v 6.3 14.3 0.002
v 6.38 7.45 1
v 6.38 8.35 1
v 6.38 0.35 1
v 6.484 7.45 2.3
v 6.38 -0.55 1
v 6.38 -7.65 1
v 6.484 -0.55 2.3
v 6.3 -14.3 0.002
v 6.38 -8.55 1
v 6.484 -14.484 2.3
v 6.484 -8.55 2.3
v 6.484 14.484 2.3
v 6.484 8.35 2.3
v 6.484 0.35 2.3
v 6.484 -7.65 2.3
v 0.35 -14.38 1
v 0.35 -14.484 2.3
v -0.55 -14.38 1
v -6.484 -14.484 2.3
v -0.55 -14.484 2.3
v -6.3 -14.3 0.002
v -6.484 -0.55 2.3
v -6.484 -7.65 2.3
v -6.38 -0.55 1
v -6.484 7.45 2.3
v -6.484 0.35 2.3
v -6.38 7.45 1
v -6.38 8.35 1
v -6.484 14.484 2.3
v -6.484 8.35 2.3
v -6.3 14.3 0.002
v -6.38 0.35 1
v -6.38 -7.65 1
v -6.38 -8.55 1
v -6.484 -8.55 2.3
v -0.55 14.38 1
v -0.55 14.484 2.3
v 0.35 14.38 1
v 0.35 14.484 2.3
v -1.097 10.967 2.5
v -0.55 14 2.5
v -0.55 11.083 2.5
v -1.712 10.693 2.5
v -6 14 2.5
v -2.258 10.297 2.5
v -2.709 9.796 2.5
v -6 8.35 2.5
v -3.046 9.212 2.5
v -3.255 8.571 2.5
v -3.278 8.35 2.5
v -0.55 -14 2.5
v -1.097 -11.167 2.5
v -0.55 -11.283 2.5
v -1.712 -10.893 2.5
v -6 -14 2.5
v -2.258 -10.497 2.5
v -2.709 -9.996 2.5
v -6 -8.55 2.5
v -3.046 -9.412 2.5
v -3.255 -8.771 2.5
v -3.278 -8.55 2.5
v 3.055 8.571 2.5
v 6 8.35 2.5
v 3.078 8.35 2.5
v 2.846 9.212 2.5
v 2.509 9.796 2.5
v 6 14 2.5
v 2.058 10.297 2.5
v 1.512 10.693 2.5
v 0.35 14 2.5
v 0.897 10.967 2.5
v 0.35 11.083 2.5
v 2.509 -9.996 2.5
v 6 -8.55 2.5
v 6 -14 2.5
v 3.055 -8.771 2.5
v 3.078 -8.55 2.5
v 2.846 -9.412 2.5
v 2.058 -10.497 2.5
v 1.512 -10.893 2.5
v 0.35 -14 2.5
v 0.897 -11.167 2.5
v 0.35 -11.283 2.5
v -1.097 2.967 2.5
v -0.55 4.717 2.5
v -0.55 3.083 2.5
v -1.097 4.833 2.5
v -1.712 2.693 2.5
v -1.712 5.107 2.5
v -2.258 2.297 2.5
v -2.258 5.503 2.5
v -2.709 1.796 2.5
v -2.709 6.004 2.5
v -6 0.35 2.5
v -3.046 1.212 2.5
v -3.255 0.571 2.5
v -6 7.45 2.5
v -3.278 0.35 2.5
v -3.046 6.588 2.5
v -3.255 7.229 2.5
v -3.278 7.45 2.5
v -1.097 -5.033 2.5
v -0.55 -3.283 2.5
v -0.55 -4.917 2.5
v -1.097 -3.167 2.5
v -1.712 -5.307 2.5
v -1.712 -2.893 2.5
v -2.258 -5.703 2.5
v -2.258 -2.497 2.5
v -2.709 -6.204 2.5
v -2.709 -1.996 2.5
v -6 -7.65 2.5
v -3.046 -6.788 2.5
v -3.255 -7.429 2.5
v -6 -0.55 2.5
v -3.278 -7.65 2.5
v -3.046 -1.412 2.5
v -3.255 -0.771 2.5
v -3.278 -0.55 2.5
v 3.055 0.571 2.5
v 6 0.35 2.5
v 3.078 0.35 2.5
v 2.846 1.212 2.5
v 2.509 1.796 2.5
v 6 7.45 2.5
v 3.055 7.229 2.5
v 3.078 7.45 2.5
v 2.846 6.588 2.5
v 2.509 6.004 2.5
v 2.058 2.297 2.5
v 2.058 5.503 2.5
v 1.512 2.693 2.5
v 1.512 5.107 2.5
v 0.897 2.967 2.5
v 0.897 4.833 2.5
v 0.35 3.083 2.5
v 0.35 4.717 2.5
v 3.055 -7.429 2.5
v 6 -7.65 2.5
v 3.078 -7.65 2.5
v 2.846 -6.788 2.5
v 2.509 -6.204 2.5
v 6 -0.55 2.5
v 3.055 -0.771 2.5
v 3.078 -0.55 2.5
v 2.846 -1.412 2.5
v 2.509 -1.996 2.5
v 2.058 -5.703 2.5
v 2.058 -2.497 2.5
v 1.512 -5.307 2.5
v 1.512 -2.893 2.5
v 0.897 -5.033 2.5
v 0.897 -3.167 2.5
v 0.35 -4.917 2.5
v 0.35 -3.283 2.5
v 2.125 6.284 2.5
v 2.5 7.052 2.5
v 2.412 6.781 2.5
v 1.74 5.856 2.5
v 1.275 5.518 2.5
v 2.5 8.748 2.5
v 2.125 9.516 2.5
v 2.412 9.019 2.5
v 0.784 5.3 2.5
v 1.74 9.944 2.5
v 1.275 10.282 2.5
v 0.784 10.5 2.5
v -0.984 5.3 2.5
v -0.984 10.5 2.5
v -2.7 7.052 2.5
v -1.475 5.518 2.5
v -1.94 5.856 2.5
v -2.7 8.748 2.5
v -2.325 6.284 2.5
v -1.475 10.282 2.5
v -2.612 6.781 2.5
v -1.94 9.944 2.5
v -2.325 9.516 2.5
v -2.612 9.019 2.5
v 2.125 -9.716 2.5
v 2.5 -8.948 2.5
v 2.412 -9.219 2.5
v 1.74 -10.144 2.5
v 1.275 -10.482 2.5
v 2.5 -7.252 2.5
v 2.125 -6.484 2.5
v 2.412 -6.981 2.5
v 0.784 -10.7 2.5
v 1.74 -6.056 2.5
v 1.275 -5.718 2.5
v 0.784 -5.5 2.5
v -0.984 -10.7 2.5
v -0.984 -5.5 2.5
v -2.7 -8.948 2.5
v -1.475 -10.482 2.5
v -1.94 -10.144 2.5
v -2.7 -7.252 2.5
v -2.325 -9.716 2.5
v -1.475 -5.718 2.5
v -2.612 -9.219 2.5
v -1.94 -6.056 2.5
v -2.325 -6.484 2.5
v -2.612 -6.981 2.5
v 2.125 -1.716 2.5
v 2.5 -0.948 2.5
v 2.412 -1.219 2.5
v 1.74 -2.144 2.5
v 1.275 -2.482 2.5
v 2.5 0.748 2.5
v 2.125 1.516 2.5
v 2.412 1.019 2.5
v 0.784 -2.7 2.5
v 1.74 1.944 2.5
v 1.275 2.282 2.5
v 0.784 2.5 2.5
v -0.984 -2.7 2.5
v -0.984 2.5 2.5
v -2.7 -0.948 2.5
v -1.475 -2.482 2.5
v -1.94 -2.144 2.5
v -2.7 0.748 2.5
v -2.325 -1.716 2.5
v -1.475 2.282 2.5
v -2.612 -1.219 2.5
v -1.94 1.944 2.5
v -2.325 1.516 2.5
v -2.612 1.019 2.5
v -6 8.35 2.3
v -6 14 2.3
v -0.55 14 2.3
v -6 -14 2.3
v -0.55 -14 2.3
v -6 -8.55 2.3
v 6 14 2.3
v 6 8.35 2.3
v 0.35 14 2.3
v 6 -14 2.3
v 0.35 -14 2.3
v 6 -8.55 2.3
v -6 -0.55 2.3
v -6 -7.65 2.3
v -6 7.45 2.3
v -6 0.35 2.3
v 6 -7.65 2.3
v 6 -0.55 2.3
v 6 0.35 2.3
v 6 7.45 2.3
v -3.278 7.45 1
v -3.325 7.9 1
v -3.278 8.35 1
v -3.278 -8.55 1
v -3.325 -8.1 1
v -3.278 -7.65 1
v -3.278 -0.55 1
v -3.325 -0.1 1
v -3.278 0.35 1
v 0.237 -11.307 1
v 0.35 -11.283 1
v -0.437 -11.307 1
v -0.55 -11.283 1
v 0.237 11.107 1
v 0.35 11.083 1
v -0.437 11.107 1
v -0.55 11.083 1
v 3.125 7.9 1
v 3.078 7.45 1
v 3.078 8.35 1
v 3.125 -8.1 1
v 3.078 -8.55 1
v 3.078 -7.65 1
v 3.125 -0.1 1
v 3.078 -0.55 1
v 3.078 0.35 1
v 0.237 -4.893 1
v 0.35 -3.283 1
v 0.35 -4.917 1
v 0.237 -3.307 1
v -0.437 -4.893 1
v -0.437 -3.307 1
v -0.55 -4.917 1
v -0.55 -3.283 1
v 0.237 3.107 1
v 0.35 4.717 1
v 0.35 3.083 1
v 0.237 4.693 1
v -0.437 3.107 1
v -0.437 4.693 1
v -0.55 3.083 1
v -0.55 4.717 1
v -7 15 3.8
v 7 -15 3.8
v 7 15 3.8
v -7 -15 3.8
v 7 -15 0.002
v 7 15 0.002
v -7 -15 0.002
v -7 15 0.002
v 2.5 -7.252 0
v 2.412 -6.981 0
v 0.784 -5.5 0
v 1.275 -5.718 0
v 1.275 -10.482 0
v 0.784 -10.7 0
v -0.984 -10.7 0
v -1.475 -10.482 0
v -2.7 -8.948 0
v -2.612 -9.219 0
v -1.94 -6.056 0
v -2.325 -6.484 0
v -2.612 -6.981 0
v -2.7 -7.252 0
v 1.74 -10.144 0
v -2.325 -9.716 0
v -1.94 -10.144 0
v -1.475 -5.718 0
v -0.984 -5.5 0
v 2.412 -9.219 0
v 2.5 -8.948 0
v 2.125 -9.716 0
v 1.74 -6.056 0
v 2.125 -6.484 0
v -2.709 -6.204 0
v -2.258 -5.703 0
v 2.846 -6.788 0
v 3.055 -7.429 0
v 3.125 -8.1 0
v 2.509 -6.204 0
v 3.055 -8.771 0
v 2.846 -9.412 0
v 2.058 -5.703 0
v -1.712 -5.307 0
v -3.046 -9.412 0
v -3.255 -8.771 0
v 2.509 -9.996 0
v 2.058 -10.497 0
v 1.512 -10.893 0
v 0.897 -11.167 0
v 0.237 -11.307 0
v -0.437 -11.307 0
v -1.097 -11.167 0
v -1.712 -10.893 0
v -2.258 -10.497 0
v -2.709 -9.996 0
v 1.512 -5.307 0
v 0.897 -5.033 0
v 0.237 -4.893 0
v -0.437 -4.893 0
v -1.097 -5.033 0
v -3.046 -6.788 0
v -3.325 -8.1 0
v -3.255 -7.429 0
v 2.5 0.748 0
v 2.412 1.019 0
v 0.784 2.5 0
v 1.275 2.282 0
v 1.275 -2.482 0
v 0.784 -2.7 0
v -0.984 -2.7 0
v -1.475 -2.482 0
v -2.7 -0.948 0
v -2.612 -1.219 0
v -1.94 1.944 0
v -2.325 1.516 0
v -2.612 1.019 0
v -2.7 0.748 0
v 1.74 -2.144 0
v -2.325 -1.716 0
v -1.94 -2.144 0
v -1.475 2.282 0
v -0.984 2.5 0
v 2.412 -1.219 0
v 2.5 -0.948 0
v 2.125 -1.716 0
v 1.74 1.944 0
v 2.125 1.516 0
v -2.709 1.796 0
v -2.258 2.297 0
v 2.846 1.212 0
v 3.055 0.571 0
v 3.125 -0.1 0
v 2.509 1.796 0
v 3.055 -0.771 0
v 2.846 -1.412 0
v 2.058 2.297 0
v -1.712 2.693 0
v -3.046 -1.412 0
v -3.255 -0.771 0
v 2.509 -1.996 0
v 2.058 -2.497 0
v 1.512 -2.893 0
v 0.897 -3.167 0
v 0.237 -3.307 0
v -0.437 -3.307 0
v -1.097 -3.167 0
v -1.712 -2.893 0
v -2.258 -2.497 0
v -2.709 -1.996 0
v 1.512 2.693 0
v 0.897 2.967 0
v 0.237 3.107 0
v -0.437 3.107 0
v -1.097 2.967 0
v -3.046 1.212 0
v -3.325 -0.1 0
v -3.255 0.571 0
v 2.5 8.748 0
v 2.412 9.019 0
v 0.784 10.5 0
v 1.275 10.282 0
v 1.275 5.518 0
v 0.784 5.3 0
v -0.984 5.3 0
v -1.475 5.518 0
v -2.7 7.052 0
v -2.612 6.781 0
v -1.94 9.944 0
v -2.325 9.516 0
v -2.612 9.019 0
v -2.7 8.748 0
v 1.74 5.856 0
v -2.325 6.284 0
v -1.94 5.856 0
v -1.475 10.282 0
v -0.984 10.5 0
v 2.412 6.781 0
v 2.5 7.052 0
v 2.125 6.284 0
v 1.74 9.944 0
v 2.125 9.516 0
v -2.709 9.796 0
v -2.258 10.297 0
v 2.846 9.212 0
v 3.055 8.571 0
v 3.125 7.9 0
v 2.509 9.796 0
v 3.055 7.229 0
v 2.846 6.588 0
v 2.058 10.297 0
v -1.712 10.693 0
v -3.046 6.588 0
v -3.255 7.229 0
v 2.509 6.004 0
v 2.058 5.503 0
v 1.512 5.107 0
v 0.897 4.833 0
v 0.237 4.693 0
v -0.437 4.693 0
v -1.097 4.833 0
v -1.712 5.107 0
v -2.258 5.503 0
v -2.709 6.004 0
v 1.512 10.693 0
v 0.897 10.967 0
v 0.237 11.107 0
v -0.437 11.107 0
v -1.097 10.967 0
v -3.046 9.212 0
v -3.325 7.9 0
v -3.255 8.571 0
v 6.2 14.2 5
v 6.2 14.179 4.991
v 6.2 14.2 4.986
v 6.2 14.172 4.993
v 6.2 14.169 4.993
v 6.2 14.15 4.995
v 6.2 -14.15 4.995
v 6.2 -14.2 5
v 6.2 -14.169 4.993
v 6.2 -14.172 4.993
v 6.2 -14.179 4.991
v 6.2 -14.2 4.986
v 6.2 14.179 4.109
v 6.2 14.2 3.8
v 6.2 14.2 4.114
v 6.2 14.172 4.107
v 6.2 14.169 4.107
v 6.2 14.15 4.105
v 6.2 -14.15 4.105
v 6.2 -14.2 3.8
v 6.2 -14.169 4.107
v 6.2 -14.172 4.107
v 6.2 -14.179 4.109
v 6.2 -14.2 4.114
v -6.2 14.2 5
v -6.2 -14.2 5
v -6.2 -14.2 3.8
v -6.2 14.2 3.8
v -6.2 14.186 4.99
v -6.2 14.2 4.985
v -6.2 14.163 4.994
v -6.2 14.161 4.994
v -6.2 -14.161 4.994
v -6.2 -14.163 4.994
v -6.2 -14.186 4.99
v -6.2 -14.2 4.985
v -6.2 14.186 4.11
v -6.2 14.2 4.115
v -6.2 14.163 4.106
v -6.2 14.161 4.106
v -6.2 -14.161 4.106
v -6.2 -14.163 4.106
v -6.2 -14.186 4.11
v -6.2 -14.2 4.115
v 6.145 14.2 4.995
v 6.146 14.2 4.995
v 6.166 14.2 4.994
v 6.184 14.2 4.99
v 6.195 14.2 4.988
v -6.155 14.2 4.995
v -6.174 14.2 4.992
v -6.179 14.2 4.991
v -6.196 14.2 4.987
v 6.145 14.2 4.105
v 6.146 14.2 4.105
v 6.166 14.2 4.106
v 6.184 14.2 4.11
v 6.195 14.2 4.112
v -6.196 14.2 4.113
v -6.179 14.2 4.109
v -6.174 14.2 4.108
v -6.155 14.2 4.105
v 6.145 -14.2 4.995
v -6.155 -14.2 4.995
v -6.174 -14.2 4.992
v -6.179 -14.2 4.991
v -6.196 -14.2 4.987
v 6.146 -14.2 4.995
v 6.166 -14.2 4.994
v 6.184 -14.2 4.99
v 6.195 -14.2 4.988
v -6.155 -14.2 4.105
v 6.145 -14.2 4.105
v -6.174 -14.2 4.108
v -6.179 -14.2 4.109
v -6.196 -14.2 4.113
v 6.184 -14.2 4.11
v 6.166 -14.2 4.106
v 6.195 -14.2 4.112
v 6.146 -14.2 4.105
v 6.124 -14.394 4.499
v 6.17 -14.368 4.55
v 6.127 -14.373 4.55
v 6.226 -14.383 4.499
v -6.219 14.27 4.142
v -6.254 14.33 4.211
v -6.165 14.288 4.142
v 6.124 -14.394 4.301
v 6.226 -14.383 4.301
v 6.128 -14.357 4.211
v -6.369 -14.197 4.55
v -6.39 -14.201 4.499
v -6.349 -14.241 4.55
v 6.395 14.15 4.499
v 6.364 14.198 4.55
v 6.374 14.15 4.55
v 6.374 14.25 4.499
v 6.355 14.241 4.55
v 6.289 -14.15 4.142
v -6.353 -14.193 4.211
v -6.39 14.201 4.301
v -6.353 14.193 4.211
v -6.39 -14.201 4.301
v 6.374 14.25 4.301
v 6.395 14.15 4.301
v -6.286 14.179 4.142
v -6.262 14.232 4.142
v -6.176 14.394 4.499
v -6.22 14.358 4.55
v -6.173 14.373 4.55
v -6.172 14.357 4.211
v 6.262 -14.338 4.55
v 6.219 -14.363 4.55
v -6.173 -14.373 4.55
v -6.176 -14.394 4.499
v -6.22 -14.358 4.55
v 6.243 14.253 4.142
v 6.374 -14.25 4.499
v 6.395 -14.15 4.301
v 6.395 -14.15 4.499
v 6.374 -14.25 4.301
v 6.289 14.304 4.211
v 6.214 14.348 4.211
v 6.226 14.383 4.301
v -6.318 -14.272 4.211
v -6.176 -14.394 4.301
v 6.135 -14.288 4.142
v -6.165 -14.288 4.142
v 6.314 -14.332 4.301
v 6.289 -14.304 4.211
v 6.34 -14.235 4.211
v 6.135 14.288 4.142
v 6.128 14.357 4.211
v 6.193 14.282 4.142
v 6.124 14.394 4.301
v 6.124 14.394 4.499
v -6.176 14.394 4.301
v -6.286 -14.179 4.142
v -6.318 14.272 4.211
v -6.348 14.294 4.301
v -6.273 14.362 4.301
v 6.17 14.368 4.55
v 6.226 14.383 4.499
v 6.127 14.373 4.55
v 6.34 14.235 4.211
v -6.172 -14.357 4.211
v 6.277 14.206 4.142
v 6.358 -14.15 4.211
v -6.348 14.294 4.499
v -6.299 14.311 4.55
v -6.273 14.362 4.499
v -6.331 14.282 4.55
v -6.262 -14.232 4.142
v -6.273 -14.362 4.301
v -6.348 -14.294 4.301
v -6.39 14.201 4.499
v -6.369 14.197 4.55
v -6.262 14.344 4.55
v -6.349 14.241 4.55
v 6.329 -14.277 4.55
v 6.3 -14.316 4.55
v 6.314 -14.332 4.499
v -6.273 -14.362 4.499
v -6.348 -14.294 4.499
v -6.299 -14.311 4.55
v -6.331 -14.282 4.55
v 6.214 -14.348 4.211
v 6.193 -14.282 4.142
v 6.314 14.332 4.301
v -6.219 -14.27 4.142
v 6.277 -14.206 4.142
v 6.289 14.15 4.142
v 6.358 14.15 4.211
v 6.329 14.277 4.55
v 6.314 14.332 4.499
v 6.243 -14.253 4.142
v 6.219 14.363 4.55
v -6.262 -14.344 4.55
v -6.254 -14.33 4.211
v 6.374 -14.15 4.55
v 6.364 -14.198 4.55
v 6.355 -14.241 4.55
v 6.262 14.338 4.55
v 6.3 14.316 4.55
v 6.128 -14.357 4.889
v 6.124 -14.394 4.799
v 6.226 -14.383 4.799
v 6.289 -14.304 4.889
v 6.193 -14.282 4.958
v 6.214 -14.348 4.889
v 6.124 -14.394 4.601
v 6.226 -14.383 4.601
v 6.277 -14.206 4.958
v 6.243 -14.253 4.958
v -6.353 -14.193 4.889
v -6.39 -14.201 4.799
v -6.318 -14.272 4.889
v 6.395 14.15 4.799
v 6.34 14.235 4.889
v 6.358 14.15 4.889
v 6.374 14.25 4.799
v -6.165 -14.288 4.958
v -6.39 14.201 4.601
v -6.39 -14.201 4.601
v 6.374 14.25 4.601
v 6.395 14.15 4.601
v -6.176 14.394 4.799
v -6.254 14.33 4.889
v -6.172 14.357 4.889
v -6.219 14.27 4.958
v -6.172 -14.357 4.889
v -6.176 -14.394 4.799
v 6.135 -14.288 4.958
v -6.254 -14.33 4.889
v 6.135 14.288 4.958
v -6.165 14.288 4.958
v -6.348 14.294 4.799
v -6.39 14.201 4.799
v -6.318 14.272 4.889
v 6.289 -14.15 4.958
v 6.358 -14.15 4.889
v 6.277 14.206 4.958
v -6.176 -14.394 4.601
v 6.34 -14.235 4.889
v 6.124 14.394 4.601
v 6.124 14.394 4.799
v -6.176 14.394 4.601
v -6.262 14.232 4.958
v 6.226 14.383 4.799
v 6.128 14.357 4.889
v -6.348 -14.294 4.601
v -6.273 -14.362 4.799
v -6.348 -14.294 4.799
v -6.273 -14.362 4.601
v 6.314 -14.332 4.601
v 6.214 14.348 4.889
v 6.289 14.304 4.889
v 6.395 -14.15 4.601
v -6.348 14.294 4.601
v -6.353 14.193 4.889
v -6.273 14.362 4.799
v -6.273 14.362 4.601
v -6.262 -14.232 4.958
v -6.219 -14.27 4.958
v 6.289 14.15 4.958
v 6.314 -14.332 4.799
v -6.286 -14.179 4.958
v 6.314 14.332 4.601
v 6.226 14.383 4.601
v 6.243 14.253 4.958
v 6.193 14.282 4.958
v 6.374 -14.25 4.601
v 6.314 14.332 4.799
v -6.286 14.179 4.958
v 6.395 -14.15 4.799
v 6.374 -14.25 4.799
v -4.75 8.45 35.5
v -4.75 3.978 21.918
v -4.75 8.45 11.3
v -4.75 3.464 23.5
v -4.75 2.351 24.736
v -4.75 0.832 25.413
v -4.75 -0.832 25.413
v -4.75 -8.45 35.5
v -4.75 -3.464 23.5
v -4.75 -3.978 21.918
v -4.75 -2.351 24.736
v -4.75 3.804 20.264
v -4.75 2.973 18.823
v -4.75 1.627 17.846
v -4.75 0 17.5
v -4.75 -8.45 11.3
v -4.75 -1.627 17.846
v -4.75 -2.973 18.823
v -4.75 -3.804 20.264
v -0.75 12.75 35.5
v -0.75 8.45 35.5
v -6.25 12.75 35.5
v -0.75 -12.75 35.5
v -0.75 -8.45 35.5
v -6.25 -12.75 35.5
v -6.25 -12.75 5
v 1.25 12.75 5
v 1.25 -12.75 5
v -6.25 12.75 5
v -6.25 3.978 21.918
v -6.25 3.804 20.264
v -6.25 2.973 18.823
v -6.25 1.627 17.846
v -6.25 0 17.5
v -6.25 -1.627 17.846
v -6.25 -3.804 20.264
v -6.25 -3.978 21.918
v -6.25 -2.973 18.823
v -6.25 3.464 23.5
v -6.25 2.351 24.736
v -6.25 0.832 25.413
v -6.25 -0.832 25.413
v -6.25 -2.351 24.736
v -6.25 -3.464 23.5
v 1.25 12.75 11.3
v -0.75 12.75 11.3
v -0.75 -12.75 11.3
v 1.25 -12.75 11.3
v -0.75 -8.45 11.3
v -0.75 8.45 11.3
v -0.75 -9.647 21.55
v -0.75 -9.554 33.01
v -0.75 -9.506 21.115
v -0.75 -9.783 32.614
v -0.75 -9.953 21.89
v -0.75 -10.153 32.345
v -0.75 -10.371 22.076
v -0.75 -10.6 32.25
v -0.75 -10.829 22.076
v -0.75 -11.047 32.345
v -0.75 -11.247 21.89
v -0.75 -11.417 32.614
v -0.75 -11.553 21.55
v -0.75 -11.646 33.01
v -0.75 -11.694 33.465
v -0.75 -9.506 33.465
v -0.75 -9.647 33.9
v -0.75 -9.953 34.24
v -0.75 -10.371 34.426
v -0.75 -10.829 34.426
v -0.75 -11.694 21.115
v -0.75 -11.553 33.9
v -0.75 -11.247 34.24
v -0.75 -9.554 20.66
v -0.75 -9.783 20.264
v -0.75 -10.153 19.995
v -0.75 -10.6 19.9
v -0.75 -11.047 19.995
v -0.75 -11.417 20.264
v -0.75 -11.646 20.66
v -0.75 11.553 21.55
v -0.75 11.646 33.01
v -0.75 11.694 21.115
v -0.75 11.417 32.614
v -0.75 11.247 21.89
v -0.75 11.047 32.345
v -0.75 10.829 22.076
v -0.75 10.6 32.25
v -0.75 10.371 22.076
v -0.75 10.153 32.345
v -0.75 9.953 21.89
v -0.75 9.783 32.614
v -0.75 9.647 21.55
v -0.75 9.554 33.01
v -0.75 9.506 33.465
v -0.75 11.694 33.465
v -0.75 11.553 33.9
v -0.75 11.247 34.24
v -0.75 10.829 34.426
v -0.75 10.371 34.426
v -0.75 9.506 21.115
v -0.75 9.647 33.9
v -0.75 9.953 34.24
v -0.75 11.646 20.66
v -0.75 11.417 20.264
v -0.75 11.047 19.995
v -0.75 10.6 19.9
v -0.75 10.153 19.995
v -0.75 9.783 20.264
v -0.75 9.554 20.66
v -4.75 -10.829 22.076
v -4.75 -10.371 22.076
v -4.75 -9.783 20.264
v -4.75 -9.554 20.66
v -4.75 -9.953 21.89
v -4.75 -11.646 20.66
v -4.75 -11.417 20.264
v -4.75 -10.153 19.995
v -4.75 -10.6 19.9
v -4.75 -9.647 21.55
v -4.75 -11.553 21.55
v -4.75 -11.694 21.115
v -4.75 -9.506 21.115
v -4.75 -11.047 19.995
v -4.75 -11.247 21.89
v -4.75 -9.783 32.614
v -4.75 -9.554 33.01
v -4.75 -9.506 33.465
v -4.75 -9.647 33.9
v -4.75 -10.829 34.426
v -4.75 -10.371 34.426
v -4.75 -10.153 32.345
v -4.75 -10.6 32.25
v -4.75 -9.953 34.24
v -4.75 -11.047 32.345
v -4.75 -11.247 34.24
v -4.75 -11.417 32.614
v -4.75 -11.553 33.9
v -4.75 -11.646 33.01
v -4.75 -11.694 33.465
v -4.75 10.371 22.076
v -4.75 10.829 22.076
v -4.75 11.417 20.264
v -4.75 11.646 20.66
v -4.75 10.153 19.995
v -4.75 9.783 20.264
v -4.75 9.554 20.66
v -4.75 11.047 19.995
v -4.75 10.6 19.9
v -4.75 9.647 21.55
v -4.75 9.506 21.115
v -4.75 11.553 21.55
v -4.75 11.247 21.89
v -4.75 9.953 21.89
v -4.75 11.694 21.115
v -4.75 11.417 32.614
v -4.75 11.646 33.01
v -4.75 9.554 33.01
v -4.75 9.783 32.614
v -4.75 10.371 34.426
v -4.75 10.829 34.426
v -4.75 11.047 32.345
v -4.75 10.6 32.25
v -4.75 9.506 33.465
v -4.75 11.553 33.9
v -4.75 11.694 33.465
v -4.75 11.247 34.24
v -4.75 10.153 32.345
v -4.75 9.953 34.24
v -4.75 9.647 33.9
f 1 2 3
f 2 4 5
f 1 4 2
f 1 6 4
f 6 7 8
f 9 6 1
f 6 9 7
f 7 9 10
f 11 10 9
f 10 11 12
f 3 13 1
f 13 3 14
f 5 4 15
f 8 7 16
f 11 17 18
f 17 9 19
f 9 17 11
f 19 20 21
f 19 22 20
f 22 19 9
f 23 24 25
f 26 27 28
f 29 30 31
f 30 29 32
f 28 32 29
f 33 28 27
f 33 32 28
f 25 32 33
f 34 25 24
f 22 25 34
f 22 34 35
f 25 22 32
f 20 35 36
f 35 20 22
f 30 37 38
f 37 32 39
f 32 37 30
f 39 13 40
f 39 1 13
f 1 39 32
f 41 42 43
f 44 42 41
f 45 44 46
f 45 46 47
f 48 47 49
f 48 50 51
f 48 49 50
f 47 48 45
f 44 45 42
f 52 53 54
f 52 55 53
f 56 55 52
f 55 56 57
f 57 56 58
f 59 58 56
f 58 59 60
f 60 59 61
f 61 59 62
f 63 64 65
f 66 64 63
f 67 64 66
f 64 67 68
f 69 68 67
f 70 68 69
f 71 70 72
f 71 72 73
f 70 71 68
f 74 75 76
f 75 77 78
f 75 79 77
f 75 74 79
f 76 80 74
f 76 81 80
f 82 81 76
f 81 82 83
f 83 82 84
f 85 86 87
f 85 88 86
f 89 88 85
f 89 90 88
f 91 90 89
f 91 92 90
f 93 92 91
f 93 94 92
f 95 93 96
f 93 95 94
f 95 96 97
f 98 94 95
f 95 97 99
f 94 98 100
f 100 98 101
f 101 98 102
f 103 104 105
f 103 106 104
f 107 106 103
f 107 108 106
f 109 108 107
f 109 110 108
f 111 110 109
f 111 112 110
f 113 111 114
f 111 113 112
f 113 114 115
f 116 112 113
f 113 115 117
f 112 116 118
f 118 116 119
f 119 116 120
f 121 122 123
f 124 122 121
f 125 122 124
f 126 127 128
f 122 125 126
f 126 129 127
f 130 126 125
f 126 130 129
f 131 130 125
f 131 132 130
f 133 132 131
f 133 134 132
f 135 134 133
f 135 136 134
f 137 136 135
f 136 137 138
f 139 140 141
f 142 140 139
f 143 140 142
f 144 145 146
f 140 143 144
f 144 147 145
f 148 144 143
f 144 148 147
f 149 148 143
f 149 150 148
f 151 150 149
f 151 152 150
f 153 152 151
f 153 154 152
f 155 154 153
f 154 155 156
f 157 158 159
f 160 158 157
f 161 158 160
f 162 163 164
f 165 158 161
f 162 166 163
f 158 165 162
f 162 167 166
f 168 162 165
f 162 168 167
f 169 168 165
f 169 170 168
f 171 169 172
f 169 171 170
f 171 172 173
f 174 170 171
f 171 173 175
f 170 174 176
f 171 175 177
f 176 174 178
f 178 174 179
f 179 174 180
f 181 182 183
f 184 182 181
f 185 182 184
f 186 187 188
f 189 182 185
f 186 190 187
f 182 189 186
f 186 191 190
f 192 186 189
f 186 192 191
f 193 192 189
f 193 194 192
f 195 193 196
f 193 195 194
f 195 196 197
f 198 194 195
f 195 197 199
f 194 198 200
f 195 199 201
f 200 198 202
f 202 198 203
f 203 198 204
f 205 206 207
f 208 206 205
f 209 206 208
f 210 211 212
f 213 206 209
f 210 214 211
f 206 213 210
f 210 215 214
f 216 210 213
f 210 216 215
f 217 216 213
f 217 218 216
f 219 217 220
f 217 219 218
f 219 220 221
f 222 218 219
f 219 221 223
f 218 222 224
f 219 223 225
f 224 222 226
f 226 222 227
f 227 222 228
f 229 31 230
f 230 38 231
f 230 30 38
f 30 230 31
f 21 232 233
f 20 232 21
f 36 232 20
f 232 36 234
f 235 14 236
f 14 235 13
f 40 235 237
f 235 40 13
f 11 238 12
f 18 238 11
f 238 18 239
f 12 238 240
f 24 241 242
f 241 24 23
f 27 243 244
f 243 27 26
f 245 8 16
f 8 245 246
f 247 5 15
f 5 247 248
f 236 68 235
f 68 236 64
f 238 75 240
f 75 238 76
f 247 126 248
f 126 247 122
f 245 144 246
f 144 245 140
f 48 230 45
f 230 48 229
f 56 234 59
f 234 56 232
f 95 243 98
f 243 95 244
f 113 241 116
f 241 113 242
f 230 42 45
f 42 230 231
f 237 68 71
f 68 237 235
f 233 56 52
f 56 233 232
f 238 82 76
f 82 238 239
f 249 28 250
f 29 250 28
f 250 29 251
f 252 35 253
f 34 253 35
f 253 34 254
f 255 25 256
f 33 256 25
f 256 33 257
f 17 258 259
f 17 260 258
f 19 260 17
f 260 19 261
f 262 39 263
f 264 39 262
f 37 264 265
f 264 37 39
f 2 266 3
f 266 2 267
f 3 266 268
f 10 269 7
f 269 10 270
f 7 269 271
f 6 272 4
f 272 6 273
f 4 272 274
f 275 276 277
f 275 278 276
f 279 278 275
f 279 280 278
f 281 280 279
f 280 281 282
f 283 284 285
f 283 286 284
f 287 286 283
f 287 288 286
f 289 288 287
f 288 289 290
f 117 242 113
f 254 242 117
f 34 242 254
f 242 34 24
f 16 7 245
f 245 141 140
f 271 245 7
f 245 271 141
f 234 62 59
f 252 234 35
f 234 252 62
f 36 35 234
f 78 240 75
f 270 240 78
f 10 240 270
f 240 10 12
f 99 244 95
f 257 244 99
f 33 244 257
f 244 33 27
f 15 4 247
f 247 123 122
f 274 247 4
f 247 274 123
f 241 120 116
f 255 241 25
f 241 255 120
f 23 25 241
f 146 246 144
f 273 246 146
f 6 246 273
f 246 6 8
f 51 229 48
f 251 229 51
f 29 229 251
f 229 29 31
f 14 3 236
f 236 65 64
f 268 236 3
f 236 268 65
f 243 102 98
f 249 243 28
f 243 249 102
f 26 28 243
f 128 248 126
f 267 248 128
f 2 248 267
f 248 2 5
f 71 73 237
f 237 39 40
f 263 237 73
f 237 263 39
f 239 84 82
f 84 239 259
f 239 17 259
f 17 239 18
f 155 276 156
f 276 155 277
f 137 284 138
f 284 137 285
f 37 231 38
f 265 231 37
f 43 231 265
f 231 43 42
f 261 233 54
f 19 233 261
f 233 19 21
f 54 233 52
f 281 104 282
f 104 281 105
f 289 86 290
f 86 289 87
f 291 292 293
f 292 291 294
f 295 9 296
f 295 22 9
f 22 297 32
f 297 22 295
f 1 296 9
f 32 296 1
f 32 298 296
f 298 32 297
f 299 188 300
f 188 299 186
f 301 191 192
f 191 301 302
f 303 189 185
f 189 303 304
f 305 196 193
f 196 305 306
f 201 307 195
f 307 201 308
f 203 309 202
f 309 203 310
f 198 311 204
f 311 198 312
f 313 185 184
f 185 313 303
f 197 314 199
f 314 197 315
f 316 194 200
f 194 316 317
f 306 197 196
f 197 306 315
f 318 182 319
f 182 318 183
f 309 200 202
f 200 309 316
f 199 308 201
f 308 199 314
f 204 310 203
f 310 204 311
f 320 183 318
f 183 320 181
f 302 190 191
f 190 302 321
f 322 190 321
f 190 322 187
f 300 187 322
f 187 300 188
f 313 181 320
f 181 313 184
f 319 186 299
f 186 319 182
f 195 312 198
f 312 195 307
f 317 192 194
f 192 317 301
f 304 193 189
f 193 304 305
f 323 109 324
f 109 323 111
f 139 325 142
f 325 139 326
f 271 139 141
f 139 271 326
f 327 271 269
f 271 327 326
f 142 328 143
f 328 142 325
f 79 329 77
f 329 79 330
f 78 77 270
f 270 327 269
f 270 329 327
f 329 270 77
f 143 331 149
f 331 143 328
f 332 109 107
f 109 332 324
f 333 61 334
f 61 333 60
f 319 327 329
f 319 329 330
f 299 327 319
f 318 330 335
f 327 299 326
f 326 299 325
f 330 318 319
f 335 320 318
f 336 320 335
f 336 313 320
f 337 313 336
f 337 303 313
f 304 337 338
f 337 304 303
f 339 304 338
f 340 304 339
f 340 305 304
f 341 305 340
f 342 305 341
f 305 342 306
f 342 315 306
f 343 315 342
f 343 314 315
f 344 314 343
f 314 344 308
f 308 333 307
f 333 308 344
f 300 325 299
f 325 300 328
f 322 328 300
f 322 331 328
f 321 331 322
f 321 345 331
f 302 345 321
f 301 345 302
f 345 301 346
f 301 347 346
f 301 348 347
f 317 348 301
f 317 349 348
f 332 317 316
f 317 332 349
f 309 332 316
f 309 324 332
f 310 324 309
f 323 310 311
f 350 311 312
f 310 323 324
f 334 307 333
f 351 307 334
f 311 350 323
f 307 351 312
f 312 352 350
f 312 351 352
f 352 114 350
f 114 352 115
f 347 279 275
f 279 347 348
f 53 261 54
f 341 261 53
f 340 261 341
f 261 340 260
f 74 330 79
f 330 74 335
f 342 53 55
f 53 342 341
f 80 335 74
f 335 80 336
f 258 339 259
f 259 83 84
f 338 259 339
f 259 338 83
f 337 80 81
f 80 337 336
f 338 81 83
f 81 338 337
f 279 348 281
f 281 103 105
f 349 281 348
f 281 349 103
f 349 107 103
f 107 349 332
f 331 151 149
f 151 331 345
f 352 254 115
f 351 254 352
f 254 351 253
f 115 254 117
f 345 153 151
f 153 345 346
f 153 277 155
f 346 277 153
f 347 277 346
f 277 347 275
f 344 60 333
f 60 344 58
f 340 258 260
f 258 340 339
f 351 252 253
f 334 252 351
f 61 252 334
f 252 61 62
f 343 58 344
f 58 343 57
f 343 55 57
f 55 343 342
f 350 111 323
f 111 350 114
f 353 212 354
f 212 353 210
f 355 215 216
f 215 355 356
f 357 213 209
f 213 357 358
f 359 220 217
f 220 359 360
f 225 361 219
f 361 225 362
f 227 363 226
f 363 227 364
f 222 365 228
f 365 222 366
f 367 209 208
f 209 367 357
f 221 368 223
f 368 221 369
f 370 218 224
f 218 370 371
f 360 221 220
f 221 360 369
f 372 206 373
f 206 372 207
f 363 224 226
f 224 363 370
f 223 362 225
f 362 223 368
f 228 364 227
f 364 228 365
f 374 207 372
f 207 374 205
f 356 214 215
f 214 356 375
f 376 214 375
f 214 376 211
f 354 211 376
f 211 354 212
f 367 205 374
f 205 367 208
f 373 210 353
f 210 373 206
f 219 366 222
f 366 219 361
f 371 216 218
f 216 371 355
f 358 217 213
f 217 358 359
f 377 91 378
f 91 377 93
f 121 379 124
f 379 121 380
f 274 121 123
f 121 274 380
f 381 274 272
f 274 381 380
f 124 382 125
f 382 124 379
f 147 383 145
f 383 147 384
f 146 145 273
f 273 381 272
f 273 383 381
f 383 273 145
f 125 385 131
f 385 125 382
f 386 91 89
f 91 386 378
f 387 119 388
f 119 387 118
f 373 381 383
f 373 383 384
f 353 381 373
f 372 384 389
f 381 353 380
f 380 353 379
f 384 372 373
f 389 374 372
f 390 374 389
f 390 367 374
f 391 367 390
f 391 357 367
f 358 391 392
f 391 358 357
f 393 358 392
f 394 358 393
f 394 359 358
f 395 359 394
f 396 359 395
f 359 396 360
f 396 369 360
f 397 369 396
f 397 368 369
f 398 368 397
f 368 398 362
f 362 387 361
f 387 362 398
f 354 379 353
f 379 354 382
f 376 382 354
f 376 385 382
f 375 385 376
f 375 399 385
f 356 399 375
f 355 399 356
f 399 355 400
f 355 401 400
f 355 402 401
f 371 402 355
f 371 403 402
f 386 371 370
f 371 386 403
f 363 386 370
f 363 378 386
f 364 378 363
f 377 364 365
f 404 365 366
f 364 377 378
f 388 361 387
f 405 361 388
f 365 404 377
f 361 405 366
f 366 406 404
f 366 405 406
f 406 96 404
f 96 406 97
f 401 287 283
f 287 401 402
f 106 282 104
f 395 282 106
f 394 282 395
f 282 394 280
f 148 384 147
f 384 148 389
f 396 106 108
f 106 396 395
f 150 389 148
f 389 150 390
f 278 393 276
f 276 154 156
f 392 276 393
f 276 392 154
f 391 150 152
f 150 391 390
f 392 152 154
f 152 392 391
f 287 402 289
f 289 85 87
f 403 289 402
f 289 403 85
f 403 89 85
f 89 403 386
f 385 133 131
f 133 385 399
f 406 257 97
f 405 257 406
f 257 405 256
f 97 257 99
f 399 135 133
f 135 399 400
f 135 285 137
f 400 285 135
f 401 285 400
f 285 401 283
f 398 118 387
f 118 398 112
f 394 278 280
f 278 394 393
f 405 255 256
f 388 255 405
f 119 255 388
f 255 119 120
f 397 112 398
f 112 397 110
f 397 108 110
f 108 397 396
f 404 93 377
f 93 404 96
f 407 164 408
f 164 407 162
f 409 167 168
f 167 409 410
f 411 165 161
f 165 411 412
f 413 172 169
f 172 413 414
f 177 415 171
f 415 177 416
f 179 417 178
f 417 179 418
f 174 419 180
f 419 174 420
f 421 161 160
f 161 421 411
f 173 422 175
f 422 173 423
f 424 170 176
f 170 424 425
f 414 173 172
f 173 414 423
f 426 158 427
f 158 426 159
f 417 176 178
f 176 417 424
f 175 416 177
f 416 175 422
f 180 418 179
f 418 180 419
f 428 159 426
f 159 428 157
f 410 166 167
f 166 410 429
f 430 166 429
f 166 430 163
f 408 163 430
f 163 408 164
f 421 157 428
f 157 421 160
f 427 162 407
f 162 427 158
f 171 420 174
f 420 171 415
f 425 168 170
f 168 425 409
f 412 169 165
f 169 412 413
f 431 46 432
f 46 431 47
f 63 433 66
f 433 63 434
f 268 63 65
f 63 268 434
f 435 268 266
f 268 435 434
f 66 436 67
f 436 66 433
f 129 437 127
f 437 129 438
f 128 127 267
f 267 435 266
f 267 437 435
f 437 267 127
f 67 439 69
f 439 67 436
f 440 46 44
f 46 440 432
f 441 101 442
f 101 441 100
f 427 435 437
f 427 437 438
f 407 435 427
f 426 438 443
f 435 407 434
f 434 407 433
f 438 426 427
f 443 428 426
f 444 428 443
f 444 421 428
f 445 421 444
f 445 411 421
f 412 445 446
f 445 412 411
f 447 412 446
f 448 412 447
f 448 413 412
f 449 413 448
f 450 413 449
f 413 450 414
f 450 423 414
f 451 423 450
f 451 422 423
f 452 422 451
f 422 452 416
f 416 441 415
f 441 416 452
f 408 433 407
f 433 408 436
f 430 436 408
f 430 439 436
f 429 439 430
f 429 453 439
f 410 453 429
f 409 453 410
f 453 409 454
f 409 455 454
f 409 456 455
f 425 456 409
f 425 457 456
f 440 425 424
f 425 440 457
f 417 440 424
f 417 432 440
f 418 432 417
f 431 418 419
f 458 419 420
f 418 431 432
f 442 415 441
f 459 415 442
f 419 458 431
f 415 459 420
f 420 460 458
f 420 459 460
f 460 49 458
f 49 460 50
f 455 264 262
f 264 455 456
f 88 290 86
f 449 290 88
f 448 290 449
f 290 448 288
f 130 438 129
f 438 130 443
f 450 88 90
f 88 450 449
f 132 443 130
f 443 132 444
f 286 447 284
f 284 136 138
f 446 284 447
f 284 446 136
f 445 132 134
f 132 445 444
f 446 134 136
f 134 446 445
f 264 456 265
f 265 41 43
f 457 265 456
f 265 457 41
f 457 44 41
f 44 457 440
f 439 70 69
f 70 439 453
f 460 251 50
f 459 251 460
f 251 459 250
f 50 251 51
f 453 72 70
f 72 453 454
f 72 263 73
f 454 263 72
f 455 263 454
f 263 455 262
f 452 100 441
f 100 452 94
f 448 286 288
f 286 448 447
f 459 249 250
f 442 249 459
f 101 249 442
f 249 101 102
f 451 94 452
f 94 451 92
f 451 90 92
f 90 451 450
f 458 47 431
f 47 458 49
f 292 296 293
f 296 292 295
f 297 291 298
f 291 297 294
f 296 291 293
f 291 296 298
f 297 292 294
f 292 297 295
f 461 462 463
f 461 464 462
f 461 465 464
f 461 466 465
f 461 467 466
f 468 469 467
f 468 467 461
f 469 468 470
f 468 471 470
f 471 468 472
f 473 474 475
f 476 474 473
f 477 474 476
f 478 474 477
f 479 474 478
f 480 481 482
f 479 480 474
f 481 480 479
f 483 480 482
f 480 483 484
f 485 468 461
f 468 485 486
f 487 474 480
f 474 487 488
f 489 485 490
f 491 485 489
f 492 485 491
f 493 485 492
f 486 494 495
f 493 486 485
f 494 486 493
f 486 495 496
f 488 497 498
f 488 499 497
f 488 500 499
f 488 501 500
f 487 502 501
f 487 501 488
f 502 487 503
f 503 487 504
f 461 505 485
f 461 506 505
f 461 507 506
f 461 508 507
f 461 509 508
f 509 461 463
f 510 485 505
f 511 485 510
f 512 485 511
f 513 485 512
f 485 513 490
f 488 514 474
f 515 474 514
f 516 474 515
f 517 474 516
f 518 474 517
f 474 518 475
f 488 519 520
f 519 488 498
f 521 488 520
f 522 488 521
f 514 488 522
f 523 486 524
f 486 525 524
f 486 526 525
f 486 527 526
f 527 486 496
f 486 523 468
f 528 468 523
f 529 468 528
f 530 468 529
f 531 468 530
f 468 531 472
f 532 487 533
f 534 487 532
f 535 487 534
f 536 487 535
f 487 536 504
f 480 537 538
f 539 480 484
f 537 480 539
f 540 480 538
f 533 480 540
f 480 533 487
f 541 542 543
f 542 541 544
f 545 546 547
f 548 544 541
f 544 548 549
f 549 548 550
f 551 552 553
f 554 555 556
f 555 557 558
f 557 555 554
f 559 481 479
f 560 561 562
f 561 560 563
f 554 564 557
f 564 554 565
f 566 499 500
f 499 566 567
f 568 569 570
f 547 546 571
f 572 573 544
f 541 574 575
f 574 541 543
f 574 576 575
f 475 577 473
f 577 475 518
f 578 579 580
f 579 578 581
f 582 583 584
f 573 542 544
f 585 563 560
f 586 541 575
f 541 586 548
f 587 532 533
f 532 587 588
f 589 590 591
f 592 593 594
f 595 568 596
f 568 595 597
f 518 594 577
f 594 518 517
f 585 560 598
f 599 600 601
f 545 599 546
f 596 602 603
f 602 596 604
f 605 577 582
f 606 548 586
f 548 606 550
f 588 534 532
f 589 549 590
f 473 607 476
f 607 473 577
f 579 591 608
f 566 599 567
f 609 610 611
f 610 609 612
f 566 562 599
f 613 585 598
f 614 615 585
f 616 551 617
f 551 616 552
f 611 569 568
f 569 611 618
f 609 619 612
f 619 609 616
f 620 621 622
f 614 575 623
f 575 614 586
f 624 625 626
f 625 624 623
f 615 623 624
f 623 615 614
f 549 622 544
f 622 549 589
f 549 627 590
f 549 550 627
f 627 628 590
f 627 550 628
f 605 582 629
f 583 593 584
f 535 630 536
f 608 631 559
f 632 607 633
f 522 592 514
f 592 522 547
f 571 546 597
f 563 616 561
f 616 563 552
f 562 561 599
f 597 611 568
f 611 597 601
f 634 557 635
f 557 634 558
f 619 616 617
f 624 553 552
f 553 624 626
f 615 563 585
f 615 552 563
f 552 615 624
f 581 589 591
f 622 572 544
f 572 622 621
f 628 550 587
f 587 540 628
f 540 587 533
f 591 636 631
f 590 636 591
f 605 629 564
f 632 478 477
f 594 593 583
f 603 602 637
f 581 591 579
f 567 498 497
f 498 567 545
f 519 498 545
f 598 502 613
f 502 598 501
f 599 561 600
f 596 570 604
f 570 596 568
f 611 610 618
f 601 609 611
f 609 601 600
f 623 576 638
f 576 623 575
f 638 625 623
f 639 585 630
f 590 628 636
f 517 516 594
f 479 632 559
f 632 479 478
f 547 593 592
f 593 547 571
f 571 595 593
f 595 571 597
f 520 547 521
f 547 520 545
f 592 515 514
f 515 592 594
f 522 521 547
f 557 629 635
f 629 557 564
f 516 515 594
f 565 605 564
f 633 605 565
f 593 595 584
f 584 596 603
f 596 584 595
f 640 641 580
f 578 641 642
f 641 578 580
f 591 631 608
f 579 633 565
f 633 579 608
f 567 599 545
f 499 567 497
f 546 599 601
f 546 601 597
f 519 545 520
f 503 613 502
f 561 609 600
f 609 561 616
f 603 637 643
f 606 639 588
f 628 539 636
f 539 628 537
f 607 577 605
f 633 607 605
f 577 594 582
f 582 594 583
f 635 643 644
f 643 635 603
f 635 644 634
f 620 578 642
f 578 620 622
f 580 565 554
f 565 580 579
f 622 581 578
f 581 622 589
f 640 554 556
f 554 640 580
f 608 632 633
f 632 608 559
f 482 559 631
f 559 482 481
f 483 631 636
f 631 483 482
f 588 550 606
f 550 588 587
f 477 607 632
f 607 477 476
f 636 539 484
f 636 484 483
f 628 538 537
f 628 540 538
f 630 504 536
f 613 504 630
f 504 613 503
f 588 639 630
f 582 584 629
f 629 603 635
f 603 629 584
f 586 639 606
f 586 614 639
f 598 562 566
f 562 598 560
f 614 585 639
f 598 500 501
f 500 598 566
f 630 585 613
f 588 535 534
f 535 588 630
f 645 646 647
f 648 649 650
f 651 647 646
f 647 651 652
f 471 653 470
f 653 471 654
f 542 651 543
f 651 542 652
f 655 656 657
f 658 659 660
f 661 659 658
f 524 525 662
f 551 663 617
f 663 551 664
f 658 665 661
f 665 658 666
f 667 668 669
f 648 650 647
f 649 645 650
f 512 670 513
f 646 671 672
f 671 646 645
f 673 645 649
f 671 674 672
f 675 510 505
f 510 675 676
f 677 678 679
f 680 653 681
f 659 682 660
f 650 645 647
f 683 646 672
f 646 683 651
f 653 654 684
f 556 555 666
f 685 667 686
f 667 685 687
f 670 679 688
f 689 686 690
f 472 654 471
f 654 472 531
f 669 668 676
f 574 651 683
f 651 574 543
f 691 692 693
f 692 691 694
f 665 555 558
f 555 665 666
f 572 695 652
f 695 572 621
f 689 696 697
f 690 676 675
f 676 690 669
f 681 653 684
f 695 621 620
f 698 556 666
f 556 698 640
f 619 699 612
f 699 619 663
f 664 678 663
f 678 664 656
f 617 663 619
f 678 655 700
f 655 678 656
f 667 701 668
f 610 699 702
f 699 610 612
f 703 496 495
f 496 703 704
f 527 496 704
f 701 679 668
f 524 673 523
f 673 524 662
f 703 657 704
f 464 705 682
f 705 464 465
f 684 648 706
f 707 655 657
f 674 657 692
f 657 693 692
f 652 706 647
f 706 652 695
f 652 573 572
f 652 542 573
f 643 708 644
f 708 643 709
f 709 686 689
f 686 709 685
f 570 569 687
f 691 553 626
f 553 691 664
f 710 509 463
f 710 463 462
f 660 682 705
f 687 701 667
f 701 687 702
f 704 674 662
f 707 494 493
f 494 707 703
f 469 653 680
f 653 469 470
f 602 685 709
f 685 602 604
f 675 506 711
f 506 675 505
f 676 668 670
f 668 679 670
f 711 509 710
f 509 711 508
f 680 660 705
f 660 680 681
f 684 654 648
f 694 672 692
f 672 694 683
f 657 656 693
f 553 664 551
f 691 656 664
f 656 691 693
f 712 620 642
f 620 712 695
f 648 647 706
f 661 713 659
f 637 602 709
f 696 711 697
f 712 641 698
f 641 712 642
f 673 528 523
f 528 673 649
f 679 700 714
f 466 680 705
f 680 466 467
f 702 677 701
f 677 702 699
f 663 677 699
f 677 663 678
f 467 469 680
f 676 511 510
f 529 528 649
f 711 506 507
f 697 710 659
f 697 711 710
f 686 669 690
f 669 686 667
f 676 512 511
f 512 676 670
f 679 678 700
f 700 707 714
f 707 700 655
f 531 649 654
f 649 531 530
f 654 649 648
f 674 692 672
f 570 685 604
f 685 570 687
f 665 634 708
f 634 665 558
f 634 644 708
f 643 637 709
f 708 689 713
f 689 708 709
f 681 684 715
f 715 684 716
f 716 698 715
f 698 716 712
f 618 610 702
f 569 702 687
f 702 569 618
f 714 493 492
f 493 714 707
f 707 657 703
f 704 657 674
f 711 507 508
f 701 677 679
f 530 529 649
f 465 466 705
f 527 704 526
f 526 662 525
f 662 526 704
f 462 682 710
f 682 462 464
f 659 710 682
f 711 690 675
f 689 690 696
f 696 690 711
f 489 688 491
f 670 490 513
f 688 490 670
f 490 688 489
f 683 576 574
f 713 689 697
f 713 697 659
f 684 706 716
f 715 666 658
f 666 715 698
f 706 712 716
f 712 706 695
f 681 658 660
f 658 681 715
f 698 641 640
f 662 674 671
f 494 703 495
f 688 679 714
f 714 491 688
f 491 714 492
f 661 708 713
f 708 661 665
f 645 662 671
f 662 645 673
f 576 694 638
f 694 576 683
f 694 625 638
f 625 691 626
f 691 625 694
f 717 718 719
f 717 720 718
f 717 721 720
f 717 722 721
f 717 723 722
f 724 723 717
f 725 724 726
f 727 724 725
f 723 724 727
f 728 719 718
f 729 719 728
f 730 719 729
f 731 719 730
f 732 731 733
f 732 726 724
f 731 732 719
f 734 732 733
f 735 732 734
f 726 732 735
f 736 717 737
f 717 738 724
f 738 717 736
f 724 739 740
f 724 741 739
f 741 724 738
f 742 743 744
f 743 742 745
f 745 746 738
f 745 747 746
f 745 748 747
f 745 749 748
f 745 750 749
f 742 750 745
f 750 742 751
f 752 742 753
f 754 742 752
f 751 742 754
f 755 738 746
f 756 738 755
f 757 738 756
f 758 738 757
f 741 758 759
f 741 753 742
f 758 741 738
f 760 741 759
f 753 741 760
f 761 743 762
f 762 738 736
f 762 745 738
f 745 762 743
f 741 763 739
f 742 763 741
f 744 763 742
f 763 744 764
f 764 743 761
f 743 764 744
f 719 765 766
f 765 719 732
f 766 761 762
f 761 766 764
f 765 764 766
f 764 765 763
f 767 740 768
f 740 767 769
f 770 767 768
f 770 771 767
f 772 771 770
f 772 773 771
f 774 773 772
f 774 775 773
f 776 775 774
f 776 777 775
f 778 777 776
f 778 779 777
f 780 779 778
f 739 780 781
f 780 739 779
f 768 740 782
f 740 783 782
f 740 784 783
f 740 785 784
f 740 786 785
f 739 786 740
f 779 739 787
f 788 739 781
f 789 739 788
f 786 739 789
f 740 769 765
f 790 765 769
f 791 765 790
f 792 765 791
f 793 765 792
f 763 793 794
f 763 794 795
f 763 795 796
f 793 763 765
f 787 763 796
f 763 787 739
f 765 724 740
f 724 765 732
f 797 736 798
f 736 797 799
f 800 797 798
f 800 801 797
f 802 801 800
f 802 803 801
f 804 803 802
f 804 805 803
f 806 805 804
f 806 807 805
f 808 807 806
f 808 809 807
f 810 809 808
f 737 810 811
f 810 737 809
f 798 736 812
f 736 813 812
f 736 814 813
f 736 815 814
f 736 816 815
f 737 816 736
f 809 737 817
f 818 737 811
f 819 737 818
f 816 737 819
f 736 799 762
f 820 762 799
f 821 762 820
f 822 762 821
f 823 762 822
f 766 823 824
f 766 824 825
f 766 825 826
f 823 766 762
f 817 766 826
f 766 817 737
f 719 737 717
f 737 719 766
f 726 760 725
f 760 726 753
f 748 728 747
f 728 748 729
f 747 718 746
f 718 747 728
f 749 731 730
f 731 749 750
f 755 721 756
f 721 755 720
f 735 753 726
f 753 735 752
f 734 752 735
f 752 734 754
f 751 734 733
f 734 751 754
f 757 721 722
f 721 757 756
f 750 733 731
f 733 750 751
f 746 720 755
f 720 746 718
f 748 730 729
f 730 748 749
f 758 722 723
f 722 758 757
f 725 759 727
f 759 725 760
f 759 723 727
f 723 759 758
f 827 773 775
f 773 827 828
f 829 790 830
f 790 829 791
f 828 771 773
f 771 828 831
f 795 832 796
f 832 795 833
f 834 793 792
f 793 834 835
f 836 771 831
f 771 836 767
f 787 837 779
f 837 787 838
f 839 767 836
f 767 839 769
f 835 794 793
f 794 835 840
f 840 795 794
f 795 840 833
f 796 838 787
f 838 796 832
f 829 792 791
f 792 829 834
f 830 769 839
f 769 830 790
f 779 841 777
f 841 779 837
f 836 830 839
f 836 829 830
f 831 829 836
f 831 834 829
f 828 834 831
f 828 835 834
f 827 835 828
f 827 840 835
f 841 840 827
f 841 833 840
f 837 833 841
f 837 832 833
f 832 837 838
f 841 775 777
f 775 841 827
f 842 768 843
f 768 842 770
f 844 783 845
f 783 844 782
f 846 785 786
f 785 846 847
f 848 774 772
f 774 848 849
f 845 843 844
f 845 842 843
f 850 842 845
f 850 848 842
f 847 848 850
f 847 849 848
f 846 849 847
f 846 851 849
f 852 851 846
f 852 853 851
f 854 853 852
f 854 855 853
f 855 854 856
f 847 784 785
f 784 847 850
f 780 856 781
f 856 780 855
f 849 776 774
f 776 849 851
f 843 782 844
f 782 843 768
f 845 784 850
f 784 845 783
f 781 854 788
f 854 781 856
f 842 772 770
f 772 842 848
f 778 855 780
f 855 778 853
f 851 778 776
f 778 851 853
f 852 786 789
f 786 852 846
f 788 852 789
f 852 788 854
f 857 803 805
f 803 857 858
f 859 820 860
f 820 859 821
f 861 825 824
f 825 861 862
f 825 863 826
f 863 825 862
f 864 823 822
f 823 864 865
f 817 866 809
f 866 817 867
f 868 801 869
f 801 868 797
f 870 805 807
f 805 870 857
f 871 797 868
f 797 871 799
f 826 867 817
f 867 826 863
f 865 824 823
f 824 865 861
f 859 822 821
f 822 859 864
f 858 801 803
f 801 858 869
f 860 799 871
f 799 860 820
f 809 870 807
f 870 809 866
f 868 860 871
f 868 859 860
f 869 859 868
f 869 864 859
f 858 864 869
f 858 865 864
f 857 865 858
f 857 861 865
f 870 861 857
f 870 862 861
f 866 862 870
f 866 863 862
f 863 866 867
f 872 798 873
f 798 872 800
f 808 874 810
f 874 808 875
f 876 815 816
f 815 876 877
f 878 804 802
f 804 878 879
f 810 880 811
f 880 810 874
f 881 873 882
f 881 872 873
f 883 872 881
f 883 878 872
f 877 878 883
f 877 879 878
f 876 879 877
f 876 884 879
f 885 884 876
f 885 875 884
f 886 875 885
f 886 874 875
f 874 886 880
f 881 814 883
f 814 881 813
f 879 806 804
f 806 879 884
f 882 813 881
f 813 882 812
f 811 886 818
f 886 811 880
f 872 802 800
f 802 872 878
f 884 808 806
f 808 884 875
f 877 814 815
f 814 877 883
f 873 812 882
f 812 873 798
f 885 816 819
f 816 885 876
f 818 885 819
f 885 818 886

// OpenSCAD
// file: ../../lib/brick-hollow.scad
/**
* Machine Blocks
* https://machinemania.net/blocks 
*
* Brick Hollow
* Copyright (c) 2022 Jan Philipp Knoeller <pk@pksoftware.de>
*
* Published under license:
* Creative Commons Attribution-NonCommercial-ShareAlike 4.0 International 
* https://creativecommons.org/licenses/by-nc-sa/4.0/
*
*/
echo(version=version());

module brickHollow(height=9.3, fade=2.5, minSize=[4.6,4.6], maxSize=[5.2, 5.2], center = false){
    echo(height, minSize, maxSize, fade);
    sizeX = max(minSize[0],maxSize[0]); 
   sizeY = max(minSize[1],maxSize[1]); 
    
    posX = center ? 0 : 0.5*sizeX; 
   posY = center ? 0 : 0.5*sizeY;   
   posZ = center ? -0.5 * (height-fade) : 0.5*fade;
    
    cutHelper = 0.2;
    overlapSpace=0.1;
    
    translate([posX, posY, posZ]){
        union(){
            polyhedron(points=[
                [-0.5*minSize[0],-0.5*minSize[1],-0.5*fade],
                [0.5*minSize[0],-0.5*minSize[1],-0.5*fade],
                [0.5*minSize[0],0.5*minSize[1],-0.5*fade],
                [-0.5*minSize[0],0.5*minSize[1],-0.5*fade],
                [-0.5*maxSize[0],-0.5*maxSize[1],0.5*fade],
                [0.5*maxSize[0],-0.5*maxSize[1],0.5*fade],
                [0.5*maxSize[0],0.5*maxSize[1],0.5*fade],
                [-0.5*maxSize[0],0.5*maxSize[1],0.5*fade]
            ], faces=[[0,1,2,3],[1,0,4,5],[2,1,5,6],[3,2,6,7],[0,3,7,4],[7,6,5,4]]);
            
            if(height > fade){
                translate([0,0,0.5*height - overlapSpace]){
                    cube([maxSize[0], maxSize[1], height - fade + overlapSpace], center=true);
                }
            }
            
            translate([0,0,-0.5*(fade + cutHelper) + overlapSpace]){
                cube([minSize[0], minSize[1], cutHelper + overlapSpace], center=true);
            }
        }
    }
}

//brickHollow(height=9.3, maxSize=[5.2,5.2], minSize=[4.6,4.6], center=true);
// file: ../../lib/roundedcube_simple.scad
/**
* Machine Blocks
* https://machinemania.net/blocks 
*
* Module for simple rounded cubes
* Copyright (c) 2022 Jan Philipp Knoeller <pk@pksoftware.de>
*
* Published under license:
* Creative Commons Attribution-NonCommercial-ShareAlike 4.0 International 
* https://creativecommons.org/licenses/by-nc-sa/4.0/
*
*/
module roundedcube_simple(size = [1, 1, 1], center = false, radius = 0.5, resolution = 20) {
	// If single value, convert to [x, y, z] vector
	size = (size[0] == undef) ? [size, size, size] : size;

	translate = (center == false) ?
		[radius, radius, radius] :
		[
			radius - (size[0] / 2),
			radius - (size[1] / 2),
			radius - (size[2] / 2)
	];

	translate(v = translate)
	minkowski() {
		cube(size = [
			size[0] - (radius * 2),
			size[1] - (radius * 2),
			size[2] - (radius * 2)
		]);
		sphere(r = radius, $fn = resolution);
	}
}
// file: ../../lib/roundedcube.scad
// More information: https://danielupshaw.com/openscad-rounded-corners/

// Set to 0.01 for higher definition curves (renders slower)
$fs = 0.15;

module roundedcube(size = [1, 1, 1], center = false, radius = 0.5, apply_to = "all", resolution = 20) {
	// If single value, convert to [x, y, z] vector
	size = (size[0] == undef) ? [size, size, size] : size;

	translate_min = radius;
	translate_xmax = size[0] - radius;
	translate_ymax = size[1] - radius;
	translate_zmax = size[2] - radius;

	diameter = radius * 2;

	obj_translate = (center == false) ?
		[0, 0, 0] : [
			-(size[0] / 2),
			-(size[1] / 2),
			-(size[2] / 2)
		];

	translate(v = obj_translate) {
		hull() {
			for (translate_x = [translate_min, translate_xmax]) {
				x_at = (translate_x == translate_min) ? "min" : "max";
				for (translate_y = [translate_min, translate_ymax]) {
					y_at = (translate_y == translate_min) ? "min" : "max";
					for (translate_z = [translate_min, translate_zmax]) {
						z_at = (translate_z == translate_min) ? "min" : "max";

						translate(v = [translate_x, translate_y, translate_z])
						if (
							(apply_to == "all") ||
							(apply_to == "xmin" && x_at == "min") || (apply_to == "xmax" && x_at == "max") ||
							(apply_to == "ymin" && y_at == "min") || (apply_to == "ymax" && y_at == "max") ||
							(apply_to == "zmin" && z_at == "min") || (apply_to == "zmax" && z_at == "max")
						) {
							sphere(r = radius, $fn = resolution);
						} else {
							rotate = 
								(apply_to == "xmin" || apply_to == "xmax" || apply_to == "x") ? [0, 90, 0] : (
								(apply_to == "ymin" || apply_to == "ymax" || apply_to == "y") ? [90, 90, 0] :
								[0, 0, 0]
							);
							rotate(a = rotate)
							cylinder(h = diameter, r = radius, center = true, $fn = resolution);
						}
					}
				}
			}
		}
	}
}
// file: ../../lib/hollow_block.scad
/**
* Machine Blocks
* https://machinemania.net/blocks 
*
* Hollow Block
* Copyright (c) 2022 Jan Philipp Knoeller <pk@pksoftware.de>
*
* Published under license:
* Creative Commons Attribution-NonCommercial-ShareAlike 4.0 International 
* https://creativecommons.org/licenses/by-nc-sa/4.0/
*
*/
echo(version=version());

include <./block-v2.scad>;

module hollowBlock(
grid = [6,6],
top = true,
center=true,
alwaysOnFloor=false,
baseSideLength=8,
adjustSizeX = -0.2,
adjustSizeY = -0.2,
plateHelperThickness = 0.5,
plateHelperHeight = 0.2,
floorHeight = 3.5,
floorHeightTolerance=0.2,
plateHeight = 0.6,
knobHeight = 2,
baseHeight = 3.1,
brickHeight = 2,
blockHeight = 0,
wallThickness = 1.5,
outerWallThickness = 0.7,
wallThicknessTolerance = 0.2,
innerWallHeight=4,
innerWallThickness = 0.6,
innerWallHolderHeight = 0.6,
innerWallHolderThickness = 0.20,
roundingRadius = 0.25,
roundingResolution = 15,
withInnerWallFilled = false,
withBarrier = false,
barrierTolerance = 0.2,
barrierHeight = 1,
barrierThickness=1,
withKnobs=true,
withKnobsFilled=true,
knobGaps=[],
blockMinWallThickness=1.4,
blockMaxWallThickness=1.6,
withLogo=false,
logoFont="Font Awesome 5 Free Regular",
logoText="\uf0eb",
logoSize=7,
logoDepth=0.5
){
    
    resultingBlockHeight = blockHeight > 0 ? blockHeight : (brickHeight * baseHeight * 3);
    totalTopHeight = withKnobs ? resultingBlockHeight+knobHeight : resultingBlockHeight;
    totalBottomHeight = floorHeight + innerWallHeight;
    
    finalObjectSizeX = (grid[0] * baseSideLength) + adjustSizeX;
    finalObjectSizeY = (grid[1] * baseSideLength) + adjustSizeY;
    
    doubleWallThickness = 2 * wallThickness;
    
    innerX = finalObjectSizeX - doubleWallThickness;
    innerY = finalObjectSizeY - doubleWallThickness;
    innerZ = resultingBlockHeight - wallThickness;
    
    topX = finalObjectSizeX - 2*outerWallThickness;
    topY = finalObjectSizeY - 2*outerWallThickness;
    
    innerWallX = innerX - 2 * wallThicknessTolerance;
    innerWallY = innerY - 2 * wallThicknessTolerance;

    bottomSizeX = finalObjectSizeX - 2*(outerWallThickness + wallThicknessTolerance);
    bottomSizeY = finalObjectSizeY - 2*(outerWallThickness + wallThicknessTolerance);
    
    
    
    if(!top){
        onFloorZ = 0.5*floorHeight;
        translateBottom = center ? [0, 0, alwaysOnFloor ? onFloorZ : 0.5 * (floorHeight - totalBottomHeight)] : [-0.5 * bottomSizeX, -0.5 * bottomSizeY, onFloorZ];
        
        //Bottom
        color("orange")
        translate(translateBottom){
            union(){
                difference(){
                    block(baseHeight=floorHeight, plateHeight=plateHeight, grid=grid, withKnobs=false,  minWallThickness=blockMinWallThickness, maxWallThickness=blockMaxWallThickness, adjustSizeX=adjustSizeX, adjustSizeY=adjustSizeY, center=true);
                    difference(){
                        cube([finalObjectSizeX + 1, finalObjectSizeY + 1, floorHeight + 1], center=true);
                        cube([bottomSizeX, bottomSizeY, floorHeight + 2], center=true);
                    };
                };
                
                if(innerWallHeight > 0){
                    //Inner wall
                    translate([0, 0, 0.5 * (floorHeight+innerWallHeight)]){
                        difference(){
                            union(){
                                cube([innerWallX, innerWallY, innerWallHeight], center=true);
                                
                               // translate([0,0,-0.25*innerWallHeight])
                                    roundedcube_simple(size = [innerWallX + 2*innerWallHolderThickness, innerWallY + 2*innerWallHolderThickness,  innerWallHolderHeight], center = true, radius=roundingRadius, resolution=roundingResolution);
                               
                               translate([0,0,0.5*(innerWallHeight-innerWallHolderHeight)])
                                    roundedcube_simple(size = [innerWallX + 2*innerWallHolderThickness, innerWallY + 2*innerWallHolderThickness,  innerWallHolderHeight], center = true, radius=roundingRadius, resolution=roundingResolution); 
                            };
                            if(!withInnerWallFilled){
                                cube([innerWallX - 2*innerWallThickness, innerWallY - 2*innerWallThickness, innerWallHeight+1], center=true);
                            }
                        }
                    }
                }
                
                
            }
        }
    }

    if(top){
        translateTop = center ? [0, 0, alwaysOnFloor ? 0 : -0.5*totalTopHeight] : [-0.5 * finalObjectSizeX, -0.5 * finalObjectSizeY, 0];
        
        //Top
        translate(translateTop){
            union(){
                difference(){
                    translate([0, 0, 0.5*totalTopHeight])
                        block(
                            baseHeight = resultingBlockHeight, 
                            minWallThickness=blockMinWallThickness, 
                            maxWallThickness=blockMaxWallThickness, 
                            withBaseHoles=false, 
                            grid=grid, 
                            withKnobs=withKnobs,
                            withKnobsFilled=withKnobsFilled, 
                            knobGaps=knobGaps, 
                            adjustSizeX=adjustSizeX, 
                            adjustSizeY=adjustSizeY, 
                            center=true,
                            withLogo=withLogo,
                            logoFont=logoFont,
                            logoText=logoText,
                            logoSize=logoSize,
                            logoDepth=logoDepth
                        );
                    
                    cube([innerX, innerY, 2*innerZ], center=true);
                    cube([topX, topY, 2*(floorHeight + floorHeightTolerance)], center=true);
                    
                    
                }
                
                if(withBarrier){
                    translate([0, 0, floorHeight + floorHeightTolerance + innerWallHeight + barrierTolerance + 0.5 * barrierHeight]){
                        color("red")
                        difference() {
                            cube([innerX, innerY, barrierHeight], center = true);
                            cube([innerX - 2*barrierThickness, innerY - 2*barrierThickness, barrierHeight*1.1], center = true);
                        };
                    }
                }
                
                //Plate Helper
                translate([0, 0, innerZ - 0.5 * plateHelperHeight]){
                    difference() {
                        cube([innerX, innerY, plateHelperHeight], center = true);
                        cube([innerX - 2*plateHelperThickness, innerY - 2*plateHelperThickness, plateHelperHeight*1.1], center = true);
                    };
                    
                }
                
                
            }
        }
    }
}
// main file
/**
* Machine Blocks
* https://machinemania.net/blocks 
*
* Raspberry Pi Camera Case Bottom
* Copyright (c) 2022 Jan Philipp Knoeller <pk@pksoftware.de>
*
* Published under license:
* Creative Commons Attribution-NonCommercial-ShareAlike 4.0 International 
* https://creativecommons.org/licenses/by-nc-sa/4.0/
*
*/
echo(version=version());

include <../../lib/hollow_block.scad>;

floorHeight = 3.8;
plateHeight = 1.3;
brickHeight = 4;

difference(){
    union(){
        hollowBlock(
            brickHeight=brickHeight, 
            floorHeight=floorHeight, 
            plateHeight=plateHeight,
            innerWallHeight=1.2, 
            withInnerWallFilled=true, 
            top=false,
            center=true, 
            alwaysOnFloor=true,
            grid=[2,4]
        );
        
        translate([-5.5,0,20.25]){
            cube([1.5, 25.5, 30.5], true);  
        }
        
        translate([-1.75,0,8.15]){
            cube([6, 25.5, 6.3], true);  
        }
        
        translate([-2.75,-10.6,23.4]){
            cube([4, 4.3, 24.2], true);  
        }
        
        translate([-2.75,10.6,23.4]){
            cube([4, 4.3, 24.2], true);  
        }
    };
    
    translate([0,0,21.5]){
        rotate([0, 90,0]){
            cylinder(h=17.9, r=0.5 * 8, center=true, $fn=15);
        }
    }
    
    translate([4.2,-10.6,21]){
        rotate([0, 90,0]){
            cylinder(h=17.9, r=0.5 * 2.2, center=true, $fn=15);
        }
    }
    
    translate([4.2,-10.6,33.35]){
        rotate([0, 90,0]){
            cylinder(h=17.9, r=0.5 * 2.2, center=true, $fn=15);
        }
    }
    
    translate([4.2,10.6,21]){
        rotate([0, 90,0]){
            cylinder(h=17.9, r=0.5 * 2.2, center=true, $fn=15);
        }
    }
    
    translate([4.2,10.6,33.35]){
        rotate([0, 90,0]){
            cylinder(h=17.9, r=0.5 * 2.2, center=true, $fn=15);
        }
    }
};
